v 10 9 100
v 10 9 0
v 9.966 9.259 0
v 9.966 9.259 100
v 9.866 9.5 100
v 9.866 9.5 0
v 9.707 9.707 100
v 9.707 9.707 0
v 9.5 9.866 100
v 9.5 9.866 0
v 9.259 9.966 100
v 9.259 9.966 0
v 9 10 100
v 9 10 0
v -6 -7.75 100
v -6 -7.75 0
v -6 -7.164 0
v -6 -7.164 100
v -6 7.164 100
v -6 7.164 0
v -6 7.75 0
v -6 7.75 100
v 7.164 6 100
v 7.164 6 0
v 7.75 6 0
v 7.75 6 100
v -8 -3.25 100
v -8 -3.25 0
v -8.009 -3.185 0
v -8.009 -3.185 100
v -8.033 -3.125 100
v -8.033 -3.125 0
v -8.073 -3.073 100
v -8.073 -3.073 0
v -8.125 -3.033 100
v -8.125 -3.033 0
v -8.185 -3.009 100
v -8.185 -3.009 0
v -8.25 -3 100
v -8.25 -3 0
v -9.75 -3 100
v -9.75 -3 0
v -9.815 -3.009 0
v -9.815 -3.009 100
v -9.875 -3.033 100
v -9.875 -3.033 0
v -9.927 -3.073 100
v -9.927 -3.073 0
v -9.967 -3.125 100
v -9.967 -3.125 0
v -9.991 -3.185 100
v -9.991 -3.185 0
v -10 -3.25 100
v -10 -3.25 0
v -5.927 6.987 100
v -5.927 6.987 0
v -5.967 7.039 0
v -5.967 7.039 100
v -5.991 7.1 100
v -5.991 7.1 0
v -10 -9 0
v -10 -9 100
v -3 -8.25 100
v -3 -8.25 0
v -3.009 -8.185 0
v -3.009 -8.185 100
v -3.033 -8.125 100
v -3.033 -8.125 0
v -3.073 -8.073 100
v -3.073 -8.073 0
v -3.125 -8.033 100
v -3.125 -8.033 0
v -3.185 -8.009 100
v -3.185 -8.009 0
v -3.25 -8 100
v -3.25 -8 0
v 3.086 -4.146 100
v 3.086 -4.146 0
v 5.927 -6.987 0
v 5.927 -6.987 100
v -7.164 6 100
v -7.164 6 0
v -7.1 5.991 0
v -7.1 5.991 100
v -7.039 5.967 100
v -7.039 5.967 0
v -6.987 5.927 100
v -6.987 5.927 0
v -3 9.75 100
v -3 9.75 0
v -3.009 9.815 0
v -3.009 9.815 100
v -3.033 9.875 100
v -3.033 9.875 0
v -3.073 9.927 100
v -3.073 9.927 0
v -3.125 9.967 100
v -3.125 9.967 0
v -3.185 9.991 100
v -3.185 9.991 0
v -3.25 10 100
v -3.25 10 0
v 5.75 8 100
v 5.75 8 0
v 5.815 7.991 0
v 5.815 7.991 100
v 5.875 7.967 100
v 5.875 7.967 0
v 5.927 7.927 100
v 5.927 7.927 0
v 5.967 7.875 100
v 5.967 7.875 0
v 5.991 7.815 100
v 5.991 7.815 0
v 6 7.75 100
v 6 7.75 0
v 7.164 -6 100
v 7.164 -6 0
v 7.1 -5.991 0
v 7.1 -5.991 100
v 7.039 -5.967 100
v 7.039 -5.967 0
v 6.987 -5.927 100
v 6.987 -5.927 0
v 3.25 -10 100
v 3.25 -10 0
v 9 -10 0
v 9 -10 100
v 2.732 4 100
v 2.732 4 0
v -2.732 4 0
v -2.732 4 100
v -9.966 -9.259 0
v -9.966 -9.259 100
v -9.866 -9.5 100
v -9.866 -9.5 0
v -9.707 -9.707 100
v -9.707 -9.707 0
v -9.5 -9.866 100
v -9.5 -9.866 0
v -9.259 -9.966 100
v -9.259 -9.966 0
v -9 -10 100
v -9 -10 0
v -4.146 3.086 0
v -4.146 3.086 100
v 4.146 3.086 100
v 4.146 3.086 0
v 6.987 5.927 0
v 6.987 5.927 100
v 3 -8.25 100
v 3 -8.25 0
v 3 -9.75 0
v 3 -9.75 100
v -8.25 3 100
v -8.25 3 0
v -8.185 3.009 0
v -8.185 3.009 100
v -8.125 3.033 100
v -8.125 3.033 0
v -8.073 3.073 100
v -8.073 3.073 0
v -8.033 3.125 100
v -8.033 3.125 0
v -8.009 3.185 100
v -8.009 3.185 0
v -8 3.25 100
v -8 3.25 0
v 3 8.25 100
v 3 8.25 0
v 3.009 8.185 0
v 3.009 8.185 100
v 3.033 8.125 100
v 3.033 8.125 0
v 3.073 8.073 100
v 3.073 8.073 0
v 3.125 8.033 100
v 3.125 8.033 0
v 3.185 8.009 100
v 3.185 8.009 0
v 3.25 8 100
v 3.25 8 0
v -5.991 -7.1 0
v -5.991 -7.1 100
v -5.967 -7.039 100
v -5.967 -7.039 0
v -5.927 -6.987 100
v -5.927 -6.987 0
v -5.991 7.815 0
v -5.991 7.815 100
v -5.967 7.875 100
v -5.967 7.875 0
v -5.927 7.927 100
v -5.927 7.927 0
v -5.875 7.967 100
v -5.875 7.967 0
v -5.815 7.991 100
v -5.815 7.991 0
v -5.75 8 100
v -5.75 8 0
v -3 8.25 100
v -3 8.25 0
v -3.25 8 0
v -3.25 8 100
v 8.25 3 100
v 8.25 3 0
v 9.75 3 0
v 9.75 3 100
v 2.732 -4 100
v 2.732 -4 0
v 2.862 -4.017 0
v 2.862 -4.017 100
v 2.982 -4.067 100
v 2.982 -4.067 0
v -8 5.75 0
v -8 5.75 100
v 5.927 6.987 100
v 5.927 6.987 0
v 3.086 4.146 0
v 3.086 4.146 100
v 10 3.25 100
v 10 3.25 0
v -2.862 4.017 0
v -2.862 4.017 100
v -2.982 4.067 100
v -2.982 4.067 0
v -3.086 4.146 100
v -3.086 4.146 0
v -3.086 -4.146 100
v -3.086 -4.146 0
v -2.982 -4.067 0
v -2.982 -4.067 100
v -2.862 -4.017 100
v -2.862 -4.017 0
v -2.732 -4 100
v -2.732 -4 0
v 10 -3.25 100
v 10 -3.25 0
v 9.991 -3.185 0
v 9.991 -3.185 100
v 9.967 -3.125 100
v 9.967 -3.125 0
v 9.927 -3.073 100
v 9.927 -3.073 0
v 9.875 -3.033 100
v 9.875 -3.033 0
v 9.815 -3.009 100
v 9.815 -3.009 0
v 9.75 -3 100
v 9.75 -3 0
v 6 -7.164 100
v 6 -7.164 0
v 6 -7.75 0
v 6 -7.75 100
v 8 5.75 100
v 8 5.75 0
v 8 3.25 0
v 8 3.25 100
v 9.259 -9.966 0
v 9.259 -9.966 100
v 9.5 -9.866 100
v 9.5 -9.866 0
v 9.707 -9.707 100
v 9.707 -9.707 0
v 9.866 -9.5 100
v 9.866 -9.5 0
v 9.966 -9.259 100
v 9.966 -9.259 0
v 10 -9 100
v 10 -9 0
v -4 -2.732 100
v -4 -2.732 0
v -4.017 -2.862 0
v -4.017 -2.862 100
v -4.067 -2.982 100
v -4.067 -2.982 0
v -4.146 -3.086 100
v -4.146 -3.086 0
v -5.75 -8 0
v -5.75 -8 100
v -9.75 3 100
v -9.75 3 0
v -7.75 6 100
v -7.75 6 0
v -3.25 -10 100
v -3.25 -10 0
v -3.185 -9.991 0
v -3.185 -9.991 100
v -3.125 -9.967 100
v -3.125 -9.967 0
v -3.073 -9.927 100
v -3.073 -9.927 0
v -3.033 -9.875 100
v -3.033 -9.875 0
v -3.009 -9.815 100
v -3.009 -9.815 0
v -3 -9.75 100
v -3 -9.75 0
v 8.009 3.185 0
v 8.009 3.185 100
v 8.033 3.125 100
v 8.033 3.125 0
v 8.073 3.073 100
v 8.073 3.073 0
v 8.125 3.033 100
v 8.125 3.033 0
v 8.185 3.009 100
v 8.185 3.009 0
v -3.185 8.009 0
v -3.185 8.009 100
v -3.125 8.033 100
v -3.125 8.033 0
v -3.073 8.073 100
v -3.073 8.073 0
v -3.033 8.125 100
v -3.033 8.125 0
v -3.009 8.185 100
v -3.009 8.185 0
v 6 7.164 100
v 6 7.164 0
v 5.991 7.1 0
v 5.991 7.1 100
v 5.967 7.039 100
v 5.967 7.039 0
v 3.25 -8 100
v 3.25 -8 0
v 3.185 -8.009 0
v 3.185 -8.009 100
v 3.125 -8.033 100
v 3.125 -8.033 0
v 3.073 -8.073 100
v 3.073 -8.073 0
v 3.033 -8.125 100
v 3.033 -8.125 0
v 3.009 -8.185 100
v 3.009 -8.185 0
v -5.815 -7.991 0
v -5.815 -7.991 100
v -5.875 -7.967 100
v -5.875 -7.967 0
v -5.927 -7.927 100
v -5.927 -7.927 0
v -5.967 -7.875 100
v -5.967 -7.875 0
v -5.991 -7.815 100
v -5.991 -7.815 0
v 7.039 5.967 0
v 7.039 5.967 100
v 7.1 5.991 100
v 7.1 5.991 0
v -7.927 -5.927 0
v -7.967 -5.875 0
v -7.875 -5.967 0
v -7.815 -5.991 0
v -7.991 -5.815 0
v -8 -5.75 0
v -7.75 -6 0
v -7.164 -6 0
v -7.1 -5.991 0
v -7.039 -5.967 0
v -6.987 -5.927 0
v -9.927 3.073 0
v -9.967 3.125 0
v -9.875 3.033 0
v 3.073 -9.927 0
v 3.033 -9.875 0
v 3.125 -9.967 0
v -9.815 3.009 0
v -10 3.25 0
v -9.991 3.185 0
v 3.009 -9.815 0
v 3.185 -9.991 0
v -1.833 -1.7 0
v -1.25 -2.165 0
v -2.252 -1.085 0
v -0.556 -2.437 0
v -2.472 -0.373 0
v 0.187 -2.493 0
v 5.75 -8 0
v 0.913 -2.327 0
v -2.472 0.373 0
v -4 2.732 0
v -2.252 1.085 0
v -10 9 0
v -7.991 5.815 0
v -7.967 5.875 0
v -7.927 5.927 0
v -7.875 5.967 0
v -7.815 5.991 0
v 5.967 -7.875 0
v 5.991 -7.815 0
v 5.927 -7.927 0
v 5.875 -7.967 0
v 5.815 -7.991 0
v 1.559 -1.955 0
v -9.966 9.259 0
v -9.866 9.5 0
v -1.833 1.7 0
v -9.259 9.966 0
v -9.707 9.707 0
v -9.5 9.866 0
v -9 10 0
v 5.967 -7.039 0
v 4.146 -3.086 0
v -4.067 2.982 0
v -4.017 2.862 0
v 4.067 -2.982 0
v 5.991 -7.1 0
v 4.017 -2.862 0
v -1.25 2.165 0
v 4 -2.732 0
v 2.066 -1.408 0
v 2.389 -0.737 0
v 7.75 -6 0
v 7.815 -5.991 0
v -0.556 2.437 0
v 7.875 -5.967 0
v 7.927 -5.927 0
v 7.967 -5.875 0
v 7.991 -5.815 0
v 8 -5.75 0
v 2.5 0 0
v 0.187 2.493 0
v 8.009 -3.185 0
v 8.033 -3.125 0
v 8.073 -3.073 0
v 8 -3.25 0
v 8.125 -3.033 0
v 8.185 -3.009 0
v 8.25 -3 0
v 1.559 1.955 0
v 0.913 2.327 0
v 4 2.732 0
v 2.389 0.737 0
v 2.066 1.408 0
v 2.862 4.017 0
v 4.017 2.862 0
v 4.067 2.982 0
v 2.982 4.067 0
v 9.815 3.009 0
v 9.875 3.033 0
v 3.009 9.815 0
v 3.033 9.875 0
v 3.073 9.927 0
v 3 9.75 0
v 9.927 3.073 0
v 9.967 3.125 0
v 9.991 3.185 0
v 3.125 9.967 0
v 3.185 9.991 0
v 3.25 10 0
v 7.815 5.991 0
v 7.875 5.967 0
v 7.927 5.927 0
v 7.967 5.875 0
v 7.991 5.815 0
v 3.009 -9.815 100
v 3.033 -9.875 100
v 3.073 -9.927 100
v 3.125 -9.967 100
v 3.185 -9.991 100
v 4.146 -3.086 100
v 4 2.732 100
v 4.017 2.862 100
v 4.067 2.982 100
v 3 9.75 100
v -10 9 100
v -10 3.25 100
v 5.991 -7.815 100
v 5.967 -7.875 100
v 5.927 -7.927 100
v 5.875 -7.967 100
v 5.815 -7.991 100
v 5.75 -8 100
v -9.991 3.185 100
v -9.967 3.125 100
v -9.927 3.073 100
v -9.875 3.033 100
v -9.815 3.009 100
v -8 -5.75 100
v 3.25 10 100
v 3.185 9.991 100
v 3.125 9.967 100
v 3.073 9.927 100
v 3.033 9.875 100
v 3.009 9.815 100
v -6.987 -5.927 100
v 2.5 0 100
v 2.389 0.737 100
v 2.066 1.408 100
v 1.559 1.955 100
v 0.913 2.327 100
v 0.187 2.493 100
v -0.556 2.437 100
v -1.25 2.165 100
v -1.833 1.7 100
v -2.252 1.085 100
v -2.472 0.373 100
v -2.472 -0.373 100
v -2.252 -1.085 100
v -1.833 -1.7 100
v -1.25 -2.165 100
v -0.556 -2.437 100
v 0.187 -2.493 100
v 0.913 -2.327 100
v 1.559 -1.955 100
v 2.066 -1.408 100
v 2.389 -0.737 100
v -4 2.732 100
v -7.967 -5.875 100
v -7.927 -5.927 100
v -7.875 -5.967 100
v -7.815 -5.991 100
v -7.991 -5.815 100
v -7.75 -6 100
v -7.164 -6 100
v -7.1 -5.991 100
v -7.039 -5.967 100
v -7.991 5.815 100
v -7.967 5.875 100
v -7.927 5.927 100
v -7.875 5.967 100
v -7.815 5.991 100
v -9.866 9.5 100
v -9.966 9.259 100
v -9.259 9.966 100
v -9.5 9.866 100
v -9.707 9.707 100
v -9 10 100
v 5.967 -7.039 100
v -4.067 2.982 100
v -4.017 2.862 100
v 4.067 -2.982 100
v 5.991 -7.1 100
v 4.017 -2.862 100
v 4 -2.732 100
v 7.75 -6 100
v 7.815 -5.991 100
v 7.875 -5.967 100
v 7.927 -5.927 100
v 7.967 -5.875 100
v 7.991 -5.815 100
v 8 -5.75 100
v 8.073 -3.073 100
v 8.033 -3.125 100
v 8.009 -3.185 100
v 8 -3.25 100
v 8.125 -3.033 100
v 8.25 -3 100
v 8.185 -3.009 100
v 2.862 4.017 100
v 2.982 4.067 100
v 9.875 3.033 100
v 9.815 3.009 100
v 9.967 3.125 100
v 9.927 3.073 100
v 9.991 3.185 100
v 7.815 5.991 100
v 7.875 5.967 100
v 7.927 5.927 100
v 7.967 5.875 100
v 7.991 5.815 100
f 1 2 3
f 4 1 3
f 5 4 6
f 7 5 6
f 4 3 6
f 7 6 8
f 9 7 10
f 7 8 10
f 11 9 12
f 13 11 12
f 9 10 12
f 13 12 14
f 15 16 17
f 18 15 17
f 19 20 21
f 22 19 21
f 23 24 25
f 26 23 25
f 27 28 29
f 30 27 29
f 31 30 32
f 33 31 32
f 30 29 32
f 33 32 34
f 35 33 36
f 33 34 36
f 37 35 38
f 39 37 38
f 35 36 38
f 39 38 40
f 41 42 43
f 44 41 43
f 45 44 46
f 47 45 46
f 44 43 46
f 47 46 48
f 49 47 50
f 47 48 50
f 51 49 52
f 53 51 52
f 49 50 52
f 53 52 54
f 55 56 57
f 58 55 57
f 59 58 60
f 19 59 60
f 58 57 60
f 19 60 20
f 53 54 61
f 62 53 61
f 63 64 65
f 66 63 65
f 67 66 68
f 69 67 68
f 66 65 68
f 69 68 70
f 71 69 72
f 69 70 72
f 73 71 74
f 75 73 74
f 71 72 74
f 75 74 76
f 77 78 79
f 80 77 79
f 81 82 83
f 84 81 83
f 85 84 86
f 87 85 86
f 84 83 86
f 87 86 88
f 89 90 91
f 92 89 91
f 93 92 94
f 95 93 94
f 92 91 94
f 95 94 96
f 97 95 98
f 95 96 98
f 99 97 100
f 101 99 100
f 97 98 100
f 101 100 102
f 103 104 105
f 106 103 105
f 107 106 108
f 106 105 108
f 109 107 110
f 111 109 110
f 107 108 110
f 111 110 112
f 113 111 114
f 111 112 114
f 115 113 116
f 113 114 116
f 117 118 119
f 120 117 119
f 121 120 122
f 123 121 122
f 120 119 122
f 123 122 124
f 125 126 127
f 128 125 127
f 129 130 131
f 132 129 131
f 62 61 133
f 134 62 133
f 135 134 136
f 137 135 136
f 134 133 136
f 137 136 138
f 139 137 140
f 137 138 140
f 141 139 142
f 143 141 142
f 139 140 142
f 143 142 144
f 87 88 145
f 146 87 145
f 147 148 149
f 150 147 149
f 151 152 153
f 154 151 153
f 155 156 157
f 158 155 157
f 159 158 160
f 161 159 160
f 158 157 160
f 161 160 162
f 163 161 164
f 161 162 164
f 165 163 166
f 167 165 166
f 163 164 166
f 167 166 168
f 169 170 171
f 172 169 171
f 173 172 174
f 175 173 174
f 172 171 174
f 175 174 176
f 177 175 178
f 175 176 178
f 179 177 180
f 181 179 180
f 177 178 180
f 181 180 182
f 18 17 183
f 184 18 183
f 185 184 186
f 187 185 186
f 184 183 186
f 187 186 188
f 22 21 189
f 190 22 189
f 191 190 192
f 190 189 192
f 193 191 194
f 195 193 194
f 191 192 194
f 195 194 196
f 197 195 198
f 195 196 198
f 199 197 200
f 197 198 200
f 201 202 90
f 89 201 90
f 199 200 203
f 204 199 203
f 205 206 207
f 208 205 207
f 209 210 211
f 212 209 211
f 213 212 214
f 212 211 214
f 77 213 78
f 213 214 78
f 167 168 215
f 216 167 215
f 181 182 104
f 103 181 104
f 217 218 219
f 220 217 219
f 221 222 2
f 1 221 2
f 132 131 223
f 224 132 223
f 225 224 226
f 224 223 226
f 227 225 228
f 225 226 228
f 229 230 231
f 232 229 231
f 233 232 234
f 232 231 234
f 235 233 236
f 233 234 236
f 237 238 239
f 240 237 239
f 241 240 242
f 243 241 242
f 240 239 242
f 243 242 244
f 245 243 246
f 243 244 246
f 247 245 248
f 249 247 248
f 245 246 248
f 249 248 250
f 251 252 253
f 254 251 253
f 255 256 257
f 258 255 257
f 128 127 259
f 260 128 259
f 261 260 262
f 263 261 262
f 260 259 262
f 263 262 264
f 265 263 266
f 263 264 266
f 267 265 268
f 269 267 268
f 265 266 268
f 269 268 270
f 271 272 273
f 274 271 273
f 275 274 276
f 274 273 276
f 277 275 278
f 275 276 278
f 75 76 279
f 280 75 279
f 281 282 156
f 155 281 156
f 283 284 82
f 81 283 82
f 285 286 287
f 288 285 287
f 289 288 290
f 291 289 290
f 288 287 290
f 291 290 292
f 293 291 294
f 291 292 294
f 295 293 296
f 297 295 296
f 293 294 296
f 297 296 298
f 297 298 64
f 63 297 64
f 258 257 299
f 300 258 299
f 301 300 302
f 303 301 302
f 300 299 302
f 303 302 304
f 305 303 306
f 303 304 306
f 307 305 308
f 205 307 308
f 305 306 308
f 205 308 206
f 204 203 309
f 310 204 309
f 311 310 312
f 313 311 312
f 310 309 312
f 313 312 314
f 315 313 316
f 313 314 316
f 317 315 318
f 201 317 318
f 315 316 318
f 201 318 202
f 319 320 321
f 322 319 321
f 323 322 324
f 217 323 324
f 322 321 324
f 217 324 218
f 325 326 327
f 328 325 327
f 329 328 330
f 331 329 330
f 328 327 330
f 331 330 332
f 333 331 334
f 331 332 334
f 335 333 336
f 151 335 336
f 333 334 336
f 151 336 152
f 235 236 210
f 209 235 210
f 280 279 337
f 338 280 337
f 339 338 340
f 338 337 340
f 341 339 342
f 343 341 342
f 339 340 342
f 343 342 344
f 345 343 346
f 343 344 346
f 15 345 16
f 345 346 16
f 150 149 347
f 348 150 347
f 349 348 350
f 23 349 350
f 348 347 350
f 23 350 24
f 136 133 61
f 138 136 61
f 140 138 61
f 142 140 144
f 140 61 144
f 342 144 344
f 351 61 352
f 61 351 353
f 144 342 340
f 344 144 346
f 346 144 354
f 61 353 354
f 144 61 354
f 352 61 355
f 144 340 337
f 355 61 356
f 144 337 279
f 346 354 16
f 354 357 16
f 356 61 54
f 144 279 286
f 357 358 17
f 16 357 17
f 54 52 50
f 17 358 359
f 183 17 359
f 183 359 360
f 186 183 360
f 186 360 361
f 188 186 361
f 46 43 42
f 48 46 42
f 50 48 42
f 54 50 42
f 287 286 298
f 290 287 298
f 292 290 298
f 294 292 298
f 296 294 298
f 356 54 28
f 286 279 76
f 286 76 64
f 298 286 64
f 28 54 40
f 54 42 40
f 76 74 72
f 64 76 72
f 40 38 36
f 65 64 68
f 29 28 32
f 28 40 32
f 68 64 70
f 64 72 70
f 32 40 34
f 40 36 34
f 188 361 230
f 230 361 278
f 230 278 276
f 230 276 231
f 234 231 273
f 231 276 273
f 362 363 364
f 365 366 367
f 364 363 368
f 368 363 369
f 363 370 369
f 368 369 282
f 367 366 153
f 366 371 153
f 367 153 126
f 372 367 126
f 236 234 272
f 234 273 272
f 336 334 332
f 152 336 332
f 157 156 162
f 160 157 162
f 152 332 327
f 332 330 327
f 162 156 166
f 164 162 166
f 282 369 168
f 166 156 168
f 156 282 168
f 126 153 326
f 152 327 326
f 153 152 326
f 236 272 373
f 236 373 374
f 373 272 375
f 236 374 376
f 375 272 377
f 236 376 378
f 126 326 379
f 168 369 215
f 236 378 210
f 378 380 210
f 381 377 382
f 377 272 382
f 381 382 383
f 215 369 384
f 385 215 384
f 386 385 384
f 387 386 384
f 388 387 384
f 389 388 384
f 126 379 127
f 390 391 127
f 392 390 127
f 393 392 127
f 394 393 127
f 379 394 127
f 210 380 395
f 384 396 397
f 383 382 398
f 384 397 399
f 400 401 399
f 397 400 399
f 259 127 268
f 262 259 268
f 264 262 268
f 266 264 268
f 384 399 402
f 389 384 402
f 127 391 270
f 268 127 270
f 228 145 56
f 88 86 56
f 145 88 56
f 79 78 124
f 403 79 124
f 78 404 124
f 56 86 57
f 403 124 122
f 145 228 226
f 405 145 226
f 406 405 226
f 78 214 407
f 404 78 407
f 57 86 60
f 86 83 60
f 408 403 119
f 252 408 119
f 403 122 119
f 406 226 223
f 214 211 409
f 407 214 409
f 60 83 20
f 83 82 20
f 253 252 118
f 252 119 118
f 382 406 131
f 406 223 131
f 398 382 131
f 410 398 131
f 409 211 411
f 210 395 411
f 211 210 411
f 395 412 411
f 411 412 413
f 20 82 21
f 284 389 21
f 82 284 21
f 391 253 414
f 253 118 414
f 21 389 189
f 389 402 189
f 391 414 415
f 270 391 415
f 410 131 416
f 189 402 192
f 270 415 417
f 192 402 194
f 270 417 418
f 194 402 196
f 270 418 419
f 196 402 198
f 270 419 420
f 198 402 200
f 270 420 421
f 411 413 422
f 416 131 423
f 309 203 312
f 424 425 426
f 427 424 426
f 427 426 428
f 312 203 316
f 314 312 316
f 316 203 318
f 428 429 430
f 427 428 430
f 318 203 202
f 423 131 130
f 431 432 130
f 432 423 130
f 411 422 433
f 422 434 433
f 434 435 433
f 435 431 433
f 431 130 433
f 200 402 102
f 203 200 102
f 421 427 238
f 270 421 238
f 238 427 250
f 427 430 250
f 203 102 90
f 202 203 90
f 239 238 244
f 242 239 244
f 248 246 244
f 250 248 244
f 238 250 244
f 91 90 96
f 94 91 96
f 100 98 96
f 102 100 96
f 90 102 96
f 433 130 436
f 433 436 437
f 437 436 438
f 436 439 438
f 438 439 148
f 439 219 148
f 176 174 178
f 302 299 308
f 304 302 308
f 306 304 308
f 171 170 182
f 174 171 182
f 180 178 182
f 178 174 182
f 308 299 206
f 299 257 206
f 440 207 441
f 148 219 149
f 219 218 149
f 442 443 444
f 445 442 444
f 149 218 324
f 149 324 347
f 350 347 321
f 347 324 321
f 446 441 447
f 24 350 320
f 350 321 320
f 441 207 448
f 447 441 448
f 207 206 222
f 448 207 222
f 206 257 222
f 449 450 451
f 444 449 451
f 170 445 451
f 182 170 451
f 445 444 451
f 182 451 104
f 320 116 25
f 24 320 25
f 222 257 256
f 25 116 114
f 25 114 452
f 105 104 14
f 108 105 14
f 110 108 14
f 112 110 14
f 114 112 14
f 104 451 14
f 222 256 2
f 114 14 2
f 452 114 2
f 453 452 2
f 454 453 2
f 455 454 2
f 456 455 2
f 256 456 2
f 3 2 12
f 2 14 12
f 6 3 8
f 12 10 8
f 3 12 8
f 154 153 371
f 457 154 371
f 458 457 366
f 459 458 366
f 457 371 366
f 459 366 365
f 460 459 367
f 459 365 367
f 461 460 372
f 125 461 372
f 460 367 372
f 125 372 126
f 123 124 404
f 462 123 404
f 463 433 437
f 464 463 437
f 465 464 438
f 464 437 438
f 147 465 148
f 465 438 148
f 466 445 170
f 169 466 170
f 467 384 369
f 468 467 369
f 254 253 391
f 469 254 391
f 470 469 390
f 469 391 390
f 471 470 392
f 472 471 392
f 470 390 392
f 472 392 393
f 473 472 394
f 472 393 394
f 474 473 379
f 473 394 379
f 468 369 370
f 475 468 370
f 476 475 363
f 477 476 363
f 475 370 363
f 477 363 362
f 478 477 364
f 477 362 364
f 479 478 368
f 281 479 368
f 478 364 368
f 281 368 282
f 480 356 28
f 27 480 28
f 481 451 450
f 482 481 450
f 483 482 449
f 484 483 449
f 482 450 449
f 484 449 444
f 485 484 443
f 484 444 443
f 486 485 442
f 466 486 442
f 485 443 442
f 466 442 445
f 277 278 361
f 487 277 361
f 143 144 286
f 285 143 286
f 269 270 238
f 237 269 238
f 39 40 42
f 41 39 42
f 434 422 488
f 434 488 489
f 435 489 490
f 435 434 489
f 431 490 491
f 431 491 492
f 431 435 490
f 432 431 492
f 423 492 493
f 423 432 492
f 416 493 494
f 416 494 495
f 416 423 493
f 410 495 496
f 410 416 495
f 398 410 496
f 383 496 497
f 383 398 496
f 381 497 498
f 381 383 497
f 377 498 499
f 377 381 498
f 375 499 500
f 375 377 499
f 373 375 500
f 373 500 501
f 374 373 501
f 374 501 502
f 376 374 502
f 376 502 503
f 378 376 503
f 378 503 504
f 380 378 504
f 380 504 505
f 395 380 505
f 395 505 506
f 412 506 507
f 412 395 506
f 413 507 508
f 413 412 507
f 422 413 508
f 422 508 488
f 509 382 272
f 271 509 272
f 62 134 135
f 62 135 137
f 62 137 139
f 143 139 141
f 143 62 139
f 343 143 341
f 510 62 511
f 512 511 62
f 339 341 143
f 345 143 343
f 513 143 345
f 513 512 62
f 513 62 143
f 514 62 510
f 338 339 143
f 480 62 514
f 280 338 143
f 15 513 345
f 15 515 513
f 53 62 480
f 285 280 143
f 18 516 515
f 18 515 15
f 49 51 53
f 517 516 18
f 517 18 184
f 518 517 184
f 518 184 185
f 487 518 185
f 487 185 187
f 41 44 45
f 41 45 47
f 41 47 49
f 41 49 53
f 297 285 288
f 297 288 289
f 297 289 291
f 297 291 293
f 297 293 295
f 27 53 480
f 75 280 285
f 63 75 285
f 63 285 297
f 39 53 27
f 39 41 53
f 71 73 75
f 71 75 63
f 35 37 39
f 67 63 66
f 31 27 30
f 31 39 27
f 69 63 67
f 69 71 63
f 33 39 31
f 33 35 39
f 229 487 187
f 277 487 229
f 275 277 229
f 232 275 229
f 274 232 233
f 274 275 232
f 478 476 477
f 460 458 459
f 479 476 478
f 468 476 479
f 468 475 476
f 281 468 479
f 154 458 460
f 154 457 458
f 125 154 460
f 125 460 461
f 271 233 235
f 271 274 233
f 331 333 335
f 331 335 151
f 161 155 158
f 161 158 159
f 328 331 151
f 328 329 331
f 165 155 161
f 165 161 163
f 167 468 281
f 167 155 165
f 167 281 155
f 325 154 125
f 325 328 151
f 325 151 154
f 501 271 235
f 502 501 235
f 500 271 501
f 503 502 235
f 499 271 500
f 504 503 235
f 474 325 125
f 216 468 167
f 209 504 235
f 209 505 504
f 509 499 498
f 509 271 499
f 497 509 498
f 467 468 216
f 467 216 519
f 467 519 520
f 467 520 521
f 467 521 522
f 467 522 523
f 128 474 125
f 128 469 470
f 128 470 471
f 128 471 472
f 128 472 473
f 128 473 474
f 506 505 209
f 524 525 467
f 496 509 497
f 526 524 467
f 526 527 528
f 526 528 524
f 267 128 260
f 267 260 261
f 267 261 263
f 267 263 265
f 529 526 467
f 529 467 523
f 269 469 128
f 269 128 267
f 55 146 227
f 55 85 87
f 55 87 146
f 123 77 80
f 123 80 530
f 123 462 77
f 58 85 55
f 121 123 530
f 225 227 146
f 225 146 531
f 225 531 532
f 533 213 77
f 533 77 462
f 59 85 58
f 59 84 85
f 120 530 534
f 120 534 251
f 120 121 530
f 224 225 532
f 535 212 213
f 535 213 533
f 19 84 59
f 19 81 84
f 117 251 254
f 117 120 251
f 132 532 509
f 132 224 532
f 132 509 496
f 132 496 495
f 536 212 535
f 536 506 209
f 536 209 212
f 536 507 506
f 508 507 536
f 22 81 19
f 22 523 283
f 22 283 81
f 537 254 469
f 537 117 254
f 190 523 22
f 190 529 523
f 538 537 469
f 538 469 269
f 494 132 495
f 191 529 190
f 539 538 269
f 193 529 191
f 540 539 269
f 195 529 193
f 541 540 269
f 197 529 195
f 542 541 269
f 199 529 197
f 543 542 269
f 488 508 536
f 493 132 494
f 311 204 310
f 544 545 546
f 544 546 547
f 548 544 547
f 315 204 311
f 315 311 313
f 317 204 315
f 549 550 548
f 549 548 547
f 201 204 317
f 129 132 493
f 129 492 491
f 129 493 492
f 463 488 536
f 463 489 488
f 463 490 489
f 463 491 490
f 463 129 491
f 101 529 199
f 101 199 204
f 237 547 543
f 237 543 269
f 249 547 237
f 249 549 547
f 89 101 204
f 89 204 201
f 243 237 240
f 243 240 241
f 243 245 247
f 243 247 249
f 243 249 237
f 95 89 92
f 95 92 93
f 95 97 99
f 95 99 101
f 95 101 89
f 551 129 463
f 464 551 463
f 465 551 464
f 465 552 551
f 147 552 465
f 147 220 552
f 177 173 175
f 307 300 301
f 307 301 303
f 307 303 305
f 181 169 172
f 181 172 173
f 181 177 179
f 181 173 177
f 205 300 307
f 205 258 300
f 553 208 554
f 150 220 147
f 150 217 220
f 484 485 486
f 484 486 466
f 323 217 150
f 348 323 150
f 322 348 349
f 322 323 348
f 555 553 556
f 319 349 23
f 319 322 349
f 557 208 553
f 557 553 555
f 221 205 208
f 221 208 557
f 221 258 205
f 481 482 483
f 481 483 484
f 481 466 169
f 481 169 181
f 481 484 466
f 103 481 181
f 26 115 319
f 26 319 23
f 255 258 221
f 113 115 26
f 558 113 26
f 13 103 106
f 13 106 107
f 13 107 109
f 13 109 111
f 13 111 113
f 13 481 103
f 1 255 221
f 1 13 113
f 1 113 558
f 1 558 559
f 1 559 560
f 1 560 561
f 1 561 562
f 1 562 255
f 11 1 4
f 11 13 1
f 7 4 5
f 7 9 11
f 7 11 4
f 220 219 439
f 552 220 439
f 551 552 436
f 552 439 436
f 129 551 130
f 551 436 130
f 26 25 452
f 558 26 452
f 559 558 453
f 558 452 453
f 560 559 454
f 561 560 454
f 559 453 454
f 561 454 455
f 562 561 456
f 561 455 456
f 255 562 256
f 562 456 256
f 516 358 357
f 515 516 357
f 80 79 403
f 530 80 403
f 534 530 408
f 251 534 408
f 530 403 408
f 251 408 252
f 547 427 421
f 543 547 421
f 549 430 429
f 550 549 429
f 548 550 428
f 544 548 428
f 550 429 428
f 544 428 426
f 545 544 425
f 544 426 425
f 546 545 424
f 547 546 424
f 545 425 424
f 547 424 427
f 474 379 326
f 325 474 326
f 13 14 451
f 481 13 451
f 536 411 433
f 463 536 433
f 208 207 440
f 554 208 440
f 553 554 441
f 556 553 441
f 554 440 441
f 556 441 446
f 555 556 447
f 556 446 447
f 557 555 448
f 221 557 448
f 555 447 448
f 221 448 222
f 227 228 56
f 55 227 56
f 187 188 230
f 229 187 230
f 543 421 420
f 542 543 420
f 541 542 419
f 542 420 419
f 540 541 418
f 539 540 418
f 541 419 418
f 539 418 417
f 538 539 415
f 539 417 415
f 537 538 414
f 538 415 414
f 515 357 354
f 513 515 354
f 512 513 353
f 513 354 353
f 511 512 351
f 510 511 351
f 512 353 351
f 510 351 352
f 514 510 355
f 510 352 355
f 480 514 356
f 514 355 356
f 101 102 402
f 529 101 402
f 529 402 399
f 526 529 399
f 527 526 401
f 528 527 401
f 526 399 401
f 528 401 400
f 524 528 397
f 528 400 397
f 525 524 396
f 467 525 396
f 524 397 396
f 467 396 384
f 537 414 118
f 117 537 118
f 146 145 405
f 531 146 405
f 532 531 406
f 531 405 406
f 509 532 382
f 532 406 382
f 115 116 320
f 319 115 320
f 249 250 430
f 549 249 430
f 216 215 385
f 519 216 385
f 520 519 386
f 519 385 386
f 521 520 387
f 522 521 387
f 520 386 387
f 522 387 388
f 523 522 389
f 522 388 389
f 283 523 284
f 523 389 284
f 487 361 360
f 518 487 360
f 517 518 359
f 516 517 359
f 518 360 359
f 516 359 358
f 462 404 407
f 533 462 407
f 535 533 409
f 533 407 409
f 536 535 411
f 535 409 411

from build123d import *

# Parameters (mm, degrees)
SKETCH2_R           = 2.5
BOSS_EXTRUDE1_DEPTH = 100


with BuildPart() as part:
    # Sketch2 → Boss-Extrude1 (new body)
    with BuildSketch(Plane.XY):
        with BuildLine():
            Line((10, 3.25), (10, 9))
            ThreePointArc((10, 9), (9.707106781, 9.707106781), (9, 10))
            Line((9, 10), (3.25, 10))
            ThreePointArc((3.25, 10), (3.073223305, 9.926776695), (3, 9.75))
            Line((3, 9.75), (3, 8.25))
            ThreePointArc((3, 8.25), (3.073223305, 8.073223305), (3.25, 8))
            Line((3.25, 8), (5.75, 8))
            ThreePointArc((5.75, 8), (5.926776695, 7.926776695), (6, 7.75))
            Line((6, 7.75), (6, 7.164213562))
            ThreePointArc((6, 7.164213562), (5.980969883, 7.068542704), (5.926776695, 6.987436867))
            Line((5.926776695, 6.987436867), (3.085786438, 4.146446609))
            ThreePointArc((3.085786438, 4.146446609), (2.923574763, 4.038060234), (2.732233047, 4))
            Line((2.732233047, 4), (-2.732233047, 4))
            ThreePointArc((-2.732233047, 4), (-2.923574763, 4.038060234), (-3.085786438, 4.146446609))
            Line((-3.085786438, 4.146446609), (-5.926776695, 6.987436867))
            ThreePointArc((-5.926776695, 6.987436867), (-5.980969883, 7.068542704), (-6, 7.164213562))
            Line((-6, 7.164213562), (-6, 7.75))
            ThreePointArc((-6, 7.75), (-5.926776695, 7.926776695), (-5.75, 8))
            Line((-5.75, 8), (-3.25, 8))
            ThreePointArc((-3.25, 8), (-3.073223305, 8.073223305), (-3, 8.25))
            Line((-3, 8.25), (-3, 9.75))
            ThreePointArc((-3, 9.75), (-3.073223305, 9.926776695), (-3.25, 10))
            Line((-3.25, 10), (-9, 10))
            ThreePointArc((-9, 10), (-9.707106781, 9.707106781), (-10, 9))
            Line((-10, 9), (-10, 3.25))
            ThreePointArc((-10, 3.25), (-9.926776695, 3.073223305), (-9.75, 3))
            Line((-9.75, 3), (-8.25, 3))
            ThreePointArc((-8.25, 3), (-8.073223305, 3.073223305), (-8, 3.25))
            Line((-8, 3.25), (-8, 5.75))
            ThreePointArc((-8, 5.75), (-7.926776695, 5.926776695), (-7.75, 6))
            Line((-7.75, 6), (-7.164213562, 6))
            ThreePointArc((-7.164213562, 6), (-7.068542704, 5.980969883), (-6.987436867, 5.926776695))
            Line((-6.987436867, 5.926776695), (-4.146446609, 3.085786438))
            ThreePointArc((-4.146446609, 3.085786438), (-4.038060234, 2.923574763), (-4, 2.732233047))
            Line((-4, 2.732233047), (-4, -2.732233047))
            ThreePointArc((-4, -2.732233047), (-4.038060234, -2.923574763), (-4.146446609, -3.085786438))
            Line((-4.146446609, -3.085786438), (-6.987436867, -5.926776695))
            ThreePointArc((-6.987436867, -5.926776695), (-7.068542704, -5.980969883), (-7.164213562, -6))
            Line((-7.164213562, -6), (-7.75, -6))
            ThreePointArc((-7.75, -6), (-7.926776695, -5.926776695), (-8, -5.75))
            Line((-8, -5.75), (-8, -3.25))
            ThreePointArc((-8, -3.25), (-8.073223305, -3.073223305), (-8.25, -3))
            Line((-8.25, -3), (-9.75, -3))
            ThreePointArc((-9.75, -3), (-9.926776695, -3.073223305), (-10, -3.25))
            Line((-10, -3.25), (-10, -9))
            ThreePointArc((-10, -9), (-9.707106781, -9.707106781), (-9, -10))
            Line((-9, -10), (-3.25, -10))
            ThreePointArc((-3.25, -10), (-3.073223305, -9.926776695), (-3, -9.75))
            Line((-3, -9.75), (-3, -8.25))
            ThreePointArc((-3, -8.25), (-3.073223305, -8.073223305), (-3.25, -8))
            Line((-3.25, -8), (-5.75, -8))
            ThreePointArc((-5.75, -8), (-5.926776695, -7.926776695), (-6, -7.75))
            Line((-6, -7.75), (-6, -7.164213562))
            ThreePointArc((-6, -7.164213562), (-5.980969883, -7.068542704), (-5.926776695, -6.987436867))
            Line((-5.926776695, -6.987436867), (-3.085786438, -4.146446609))
            ThreePointArc((-3.085786438, -4.146446609), (-2.923574763, -4.038060234), (-2.732233047, -4))
            Line((-2.732233047, -4), (2.732233047, -4))
            ThreePointArc((2.732233047, -4), (2.923574763, -4.038060234), (3.085786438, -4.146446609))
            Line((3.085786438, -4.146446609), (5.926776695, -6.987436867))
            ThreePointArc((5.926776695, -6.987436867), (5.980969883, -7.068542704), (6, -7.164213562))
            Line((6, -7.164213562), (6, -7.75))
            ThreePointArc((6, -7.75), (5.926776695, -7.926776695), (5.75, -8))
            Line((5.75, -8), (3.25, -8))
            ThreePointArc((3.25, -8), (3.073223305, -8.073223305), (3, -8.25))
            Line((3, -8.25), (3, -9.75))
            ThreePointArc((3, -9.75), (3.073223305, -9.926776695), (3.25, -10))
            Line((3.25, -10), (9, -10))
            ThreePointArc((9, -10), (9.707106781, -9.707106781), (10, -9))
            Line((10, -9), (10, -3.25))
            ThreePointArc((10, -3.25), (9.926776695, -3.073223305), (9.75, -3))
            Line((9.75, -3), (8.25, -3))
            ThreePointArc((8.25, -3), (8.073223305, -3.073223305), (8, -3.25))
            Line((8, -3.25), (8, -5.75))
            ThreePointArc((8, -5.75), (7.926776695, -5.926776695), (7.75, -6))
            Line((7.75, -6), (7.164213562, -6))
            ThreePointArc((7.164213562, -6), (7.068542704, -5.980969883), (6.987436867, -5.926776695))
            Line((6.987436867, -5.926776695), (4.146446609, -3.085786438))
            ThreePointArc((4.146446609, -3.085786438), (4.038060234, -2.923574763), (4, -2.732233047))
            Line((4, -2.732233047), (4, 2.732233047))
            ThreePointArc((4, 2.732233047), (4.038060234, 2.923574763), (4.146446609, 3.085786438))
            Line((4.146446609, 3.085786438), (6.987436867, 5.926776695))
            ThreePointArc((6.987436867, 5.926776695), (7.068542704, 5.980969883), (7.164213562, 6))
            Line((7.164213562, 6), (7.75, 6))
            ThreePointArc((7.75, 6), (7.926776695, 5.926776695), (8, 5.75))
            Line((8, 5.75), (8, 3.25))
            ThreePointArc((8, 3.25), (8.073223305, 3.073223305), (8.25, 3))
            Line((8.25, 3), (9.75, 3))
            ThreePointArc((9.75, 3), (9.926776695, 3.073223305), (10, 3.25))
        make_face()
        Circle(SKETCH2_R, mode=Mode.SUBTRACT)
    extrude(amount=BOSS_EXTRUDE1_DEPTH)


solid = part.part
